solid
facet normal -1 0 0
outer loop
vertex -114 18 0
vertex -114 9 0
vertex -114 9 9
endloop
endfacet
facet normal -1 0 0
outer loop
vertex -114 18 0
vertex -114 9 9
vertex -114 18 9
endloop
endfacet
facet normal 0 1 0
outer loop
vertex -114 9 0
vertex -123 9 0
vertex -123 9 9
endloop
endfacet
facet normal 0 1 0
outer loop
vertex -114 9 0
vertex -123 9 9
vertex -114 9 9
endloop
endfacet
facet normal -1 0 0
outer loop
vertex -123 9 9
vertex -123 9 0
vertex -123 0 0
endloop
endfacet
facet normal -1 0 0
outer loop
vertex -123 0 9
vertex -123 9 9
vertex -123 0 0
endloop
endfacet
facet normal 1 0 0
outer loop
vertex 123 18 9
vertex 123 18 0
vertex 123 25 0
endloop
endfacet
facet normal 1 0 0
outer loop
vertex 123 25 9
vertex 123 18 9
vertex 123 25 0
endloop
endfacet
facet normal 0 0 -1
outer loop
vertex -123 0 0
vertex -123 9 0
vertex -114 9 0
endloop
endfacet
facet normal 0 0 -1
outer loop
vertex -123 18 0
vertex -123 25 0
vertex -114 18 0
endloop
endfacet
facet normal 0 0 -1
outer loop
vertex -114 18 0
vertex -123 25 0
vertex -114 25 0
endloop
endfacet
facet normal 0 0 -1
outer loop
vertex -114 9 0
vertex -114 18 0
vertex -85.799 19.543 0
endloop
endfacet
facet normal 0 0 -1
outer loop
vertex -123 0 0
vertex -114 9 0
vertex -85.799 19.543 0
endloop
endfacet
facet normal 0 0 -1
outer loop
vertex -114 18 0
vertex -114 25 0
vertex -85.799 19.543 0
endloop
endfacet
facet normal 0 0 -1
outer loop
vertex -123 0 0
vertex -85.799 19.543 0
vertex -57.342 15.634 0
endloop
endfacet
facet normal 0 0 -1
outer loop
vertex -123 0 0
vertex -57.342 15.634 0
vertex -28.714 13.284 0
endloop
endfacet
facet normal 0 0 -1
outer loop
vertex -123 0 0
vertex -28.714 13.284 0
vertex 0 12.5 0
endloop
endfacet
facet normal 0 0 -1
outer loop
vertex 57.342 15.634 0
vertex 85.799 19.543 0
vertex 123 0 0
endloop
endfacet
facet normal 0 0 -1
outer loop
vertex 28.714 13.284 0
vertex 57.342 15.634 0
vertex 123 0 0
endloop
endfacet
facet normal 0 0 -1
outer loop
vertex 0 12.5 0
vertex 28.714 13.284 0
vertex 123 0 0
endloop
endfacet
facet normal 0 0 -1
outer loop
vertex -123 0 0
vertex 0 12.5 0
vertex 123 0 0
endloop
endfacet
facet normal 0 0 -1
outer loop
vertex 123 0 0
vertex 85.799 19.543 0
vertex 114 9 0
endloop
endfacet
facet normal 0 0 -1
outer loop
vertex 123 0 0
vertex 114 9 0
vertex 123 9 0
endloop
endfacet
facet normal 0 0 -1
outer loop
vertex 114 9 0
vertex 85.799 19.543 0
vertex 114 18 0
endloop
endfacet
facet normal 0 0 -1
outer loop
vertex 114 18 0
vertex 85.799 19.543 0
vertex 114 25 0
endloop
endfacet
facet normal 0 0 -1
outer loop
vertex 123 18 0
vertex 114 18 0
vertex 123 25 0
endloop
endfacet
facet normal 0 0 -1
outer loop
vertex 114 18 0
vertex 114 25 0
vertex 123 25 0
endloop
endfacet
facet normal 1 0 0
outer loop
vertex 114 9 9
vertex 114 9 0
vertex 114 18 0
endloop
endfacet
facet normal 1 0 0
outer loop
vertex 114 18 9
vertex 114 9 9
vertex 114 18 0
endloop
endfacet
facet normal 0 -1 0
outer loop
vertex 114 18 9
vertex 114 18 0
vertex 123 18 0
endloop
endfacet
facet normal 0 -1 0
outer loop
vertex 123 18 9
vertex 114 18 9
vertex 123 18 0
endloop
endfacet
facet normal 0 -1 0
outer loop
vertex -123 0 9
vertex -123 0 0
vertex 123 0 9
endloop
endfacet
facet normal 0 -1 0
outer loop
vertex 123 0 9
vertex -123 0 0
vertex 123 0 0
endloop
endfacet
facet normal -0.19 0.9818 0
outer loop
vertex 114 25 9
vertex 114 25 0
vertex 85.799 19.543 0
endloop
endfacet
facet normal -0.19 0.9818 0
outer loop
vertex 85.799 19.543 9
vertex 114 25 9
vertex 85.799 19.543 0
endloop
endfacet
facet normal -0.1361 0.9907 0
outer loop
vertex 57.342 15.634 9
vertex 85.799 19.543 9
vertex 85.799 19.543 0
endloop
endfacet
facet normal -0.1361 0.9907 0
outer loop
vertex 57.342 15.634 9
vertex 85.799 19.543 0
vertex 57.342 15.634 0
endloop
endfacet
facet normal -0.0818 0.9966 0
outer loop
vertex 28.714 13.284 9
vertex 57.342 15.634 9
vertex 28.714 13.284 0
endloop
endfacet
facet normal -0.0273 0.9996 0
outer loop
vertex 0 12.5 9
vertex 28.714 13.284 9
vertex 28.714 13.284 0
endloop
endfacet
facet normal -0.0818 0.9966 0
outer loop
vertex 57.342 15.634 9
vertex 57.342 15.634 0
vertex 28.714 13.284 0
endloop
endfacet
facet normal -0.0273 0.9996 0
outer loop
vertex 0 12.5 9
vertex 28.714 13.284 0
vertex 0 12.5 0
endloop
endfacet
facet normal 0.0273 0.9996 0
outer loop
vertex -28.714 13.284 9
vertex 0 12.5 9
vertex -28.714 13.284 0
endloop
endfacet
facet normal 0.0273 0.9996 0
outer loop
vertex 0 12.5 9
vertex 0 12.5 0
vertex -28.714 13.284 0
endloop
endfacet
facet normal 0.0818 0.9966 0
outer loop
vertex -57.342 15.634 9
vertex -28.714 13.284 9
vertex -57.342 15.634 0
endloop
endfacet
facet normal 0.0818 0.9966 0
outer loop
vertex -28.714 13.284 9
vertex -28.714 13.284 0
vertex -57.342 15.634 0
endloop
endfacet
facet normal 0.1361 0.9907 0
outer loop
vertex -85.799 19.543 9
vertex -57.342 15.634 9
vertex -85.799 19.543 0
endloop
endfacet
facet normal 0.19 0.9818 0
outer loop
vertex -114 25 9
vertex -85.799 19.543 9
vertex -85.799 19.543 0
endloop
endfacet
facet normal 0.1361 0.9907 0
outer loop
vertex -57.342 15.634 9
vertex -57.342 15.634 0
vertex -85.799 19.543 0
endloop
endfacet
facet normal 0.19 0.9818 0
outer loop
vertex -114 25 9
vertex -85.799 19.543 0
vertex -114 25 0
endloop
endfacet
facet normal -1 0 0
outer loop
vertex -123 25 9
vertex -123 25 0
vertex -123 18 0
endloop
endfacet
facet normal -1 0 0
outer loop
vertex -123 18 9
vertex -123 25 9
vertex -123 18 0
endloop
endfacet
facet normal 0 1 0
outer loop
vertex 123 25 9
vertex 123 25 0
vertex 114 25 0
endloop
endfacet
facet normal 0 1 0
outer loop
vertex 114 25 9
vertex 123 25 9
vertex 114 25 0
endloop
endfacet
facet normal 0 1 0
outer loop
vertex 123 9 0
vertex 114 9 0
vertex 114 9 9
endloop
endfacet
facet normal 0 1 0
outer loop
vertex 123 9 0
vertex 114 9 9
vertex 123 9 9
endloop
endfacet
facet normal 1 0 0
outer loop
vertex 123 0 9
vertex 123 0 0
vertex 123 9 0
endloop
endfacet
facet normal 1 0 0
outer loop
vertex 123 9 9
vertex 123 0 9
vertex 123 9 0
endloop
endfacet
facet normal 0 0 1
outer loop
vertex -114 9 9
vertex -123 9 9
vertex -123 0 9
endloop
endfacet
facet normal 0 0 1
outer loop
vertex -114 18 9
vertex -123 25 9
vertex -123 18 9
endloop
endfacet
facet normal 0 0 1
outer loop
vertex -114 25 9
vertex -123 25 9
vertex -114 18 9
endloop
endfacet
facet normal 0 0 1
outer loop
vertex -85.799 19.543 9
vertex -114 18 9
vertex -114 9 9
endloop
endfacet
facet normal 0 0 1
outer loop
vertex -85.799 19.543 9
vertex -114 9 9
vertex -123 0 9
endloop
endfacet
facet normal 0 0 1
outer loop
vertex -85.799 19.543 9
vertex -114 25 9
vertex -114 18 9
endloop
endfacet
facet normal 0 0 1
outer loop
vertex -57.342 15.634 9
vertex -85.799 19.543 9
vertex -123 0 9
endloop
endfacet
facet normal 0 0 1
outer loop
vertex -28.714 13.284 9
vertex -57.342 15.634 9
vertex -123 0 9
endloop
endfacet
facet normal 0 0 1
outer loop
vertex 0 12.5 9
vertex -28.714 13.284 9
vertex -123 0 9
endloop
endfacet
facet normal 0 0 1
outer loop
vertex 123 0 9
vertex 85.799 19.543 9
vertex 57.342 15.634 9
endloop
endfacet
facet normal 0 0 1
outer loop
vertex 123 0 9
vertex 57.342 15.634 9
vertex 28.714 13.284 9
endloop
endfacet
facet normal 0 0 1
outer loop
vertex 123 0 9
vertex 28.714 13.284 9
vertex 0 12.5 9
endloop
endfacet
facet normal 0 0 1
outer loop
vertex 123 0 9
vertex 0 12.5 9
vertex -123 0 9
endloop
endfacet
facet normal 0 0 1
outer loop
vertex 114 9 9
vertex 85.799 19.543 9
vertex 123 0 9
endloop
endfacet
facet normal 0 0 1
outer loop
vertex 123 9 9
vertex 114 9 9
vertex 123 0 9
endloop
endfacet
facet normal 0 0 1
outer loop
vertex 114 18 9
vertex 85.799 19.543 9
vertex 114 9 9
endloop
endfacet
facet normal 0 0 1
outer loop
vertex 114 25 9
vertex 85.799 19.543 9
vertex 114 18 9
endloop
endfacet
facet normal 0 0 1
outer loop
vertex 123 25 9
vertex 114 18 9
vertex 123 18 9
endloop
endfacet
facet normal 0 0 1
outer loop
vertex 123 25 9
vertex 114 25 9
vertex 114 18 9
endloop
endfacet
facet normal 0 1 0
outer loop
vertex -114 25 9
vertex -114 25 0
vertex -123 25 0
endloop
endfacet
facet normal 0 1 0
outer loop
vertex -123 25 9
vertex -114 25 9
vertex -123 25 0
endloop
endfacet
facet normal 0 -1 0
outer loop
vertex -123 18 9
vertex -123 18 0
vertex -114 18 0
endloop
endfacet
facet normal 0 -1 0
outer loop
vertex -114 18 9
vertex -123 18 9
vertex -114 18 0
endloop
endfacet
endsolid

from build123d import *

# Parameters (mm, degrees)
BOSS_EXTRUDE2_DEPTH = 9
SKETCH2_W           = 9
SKETCH2_H           = 9
CUT_EXTRUDE1_DEPTH  = 126.837196409


with BuildPart() as part:
    # Sketch1 → Boss-Extrude2 (new body)
    with BuildSketch(Plane.XY):
        with BuildLine():
            Line((-123, 25), (-123, 0))
            Line((-123, 0), (123, 0))
            Line((123, 0), (123, 25))
            Line((123, 25), (114, 25))
            ThreePointArc((114, 25), (0, 12.5), (-114, 25))
            Line((-114, 25), (-123, 25))
        make_face()
    extrude(amount=BOSS_EXTRUDE2_DEPTH)

    # Sketch2 → Cut-Extrude1 (cut, through all)
    with BuildSketch(Plane.XY):
        with Locations((118.5, 13.5)):
            Rectangle(SKETCH2_W, SKETCH2_H)
        with Locations((-118.5, 13.5)):
            Rectangle(SKETCH2_W, SKETCH2_H)
    extrude(amount=CUT_EXTRUDE1_DEPTH, mode=Mode.SUBTRACT)


solid = part.part
